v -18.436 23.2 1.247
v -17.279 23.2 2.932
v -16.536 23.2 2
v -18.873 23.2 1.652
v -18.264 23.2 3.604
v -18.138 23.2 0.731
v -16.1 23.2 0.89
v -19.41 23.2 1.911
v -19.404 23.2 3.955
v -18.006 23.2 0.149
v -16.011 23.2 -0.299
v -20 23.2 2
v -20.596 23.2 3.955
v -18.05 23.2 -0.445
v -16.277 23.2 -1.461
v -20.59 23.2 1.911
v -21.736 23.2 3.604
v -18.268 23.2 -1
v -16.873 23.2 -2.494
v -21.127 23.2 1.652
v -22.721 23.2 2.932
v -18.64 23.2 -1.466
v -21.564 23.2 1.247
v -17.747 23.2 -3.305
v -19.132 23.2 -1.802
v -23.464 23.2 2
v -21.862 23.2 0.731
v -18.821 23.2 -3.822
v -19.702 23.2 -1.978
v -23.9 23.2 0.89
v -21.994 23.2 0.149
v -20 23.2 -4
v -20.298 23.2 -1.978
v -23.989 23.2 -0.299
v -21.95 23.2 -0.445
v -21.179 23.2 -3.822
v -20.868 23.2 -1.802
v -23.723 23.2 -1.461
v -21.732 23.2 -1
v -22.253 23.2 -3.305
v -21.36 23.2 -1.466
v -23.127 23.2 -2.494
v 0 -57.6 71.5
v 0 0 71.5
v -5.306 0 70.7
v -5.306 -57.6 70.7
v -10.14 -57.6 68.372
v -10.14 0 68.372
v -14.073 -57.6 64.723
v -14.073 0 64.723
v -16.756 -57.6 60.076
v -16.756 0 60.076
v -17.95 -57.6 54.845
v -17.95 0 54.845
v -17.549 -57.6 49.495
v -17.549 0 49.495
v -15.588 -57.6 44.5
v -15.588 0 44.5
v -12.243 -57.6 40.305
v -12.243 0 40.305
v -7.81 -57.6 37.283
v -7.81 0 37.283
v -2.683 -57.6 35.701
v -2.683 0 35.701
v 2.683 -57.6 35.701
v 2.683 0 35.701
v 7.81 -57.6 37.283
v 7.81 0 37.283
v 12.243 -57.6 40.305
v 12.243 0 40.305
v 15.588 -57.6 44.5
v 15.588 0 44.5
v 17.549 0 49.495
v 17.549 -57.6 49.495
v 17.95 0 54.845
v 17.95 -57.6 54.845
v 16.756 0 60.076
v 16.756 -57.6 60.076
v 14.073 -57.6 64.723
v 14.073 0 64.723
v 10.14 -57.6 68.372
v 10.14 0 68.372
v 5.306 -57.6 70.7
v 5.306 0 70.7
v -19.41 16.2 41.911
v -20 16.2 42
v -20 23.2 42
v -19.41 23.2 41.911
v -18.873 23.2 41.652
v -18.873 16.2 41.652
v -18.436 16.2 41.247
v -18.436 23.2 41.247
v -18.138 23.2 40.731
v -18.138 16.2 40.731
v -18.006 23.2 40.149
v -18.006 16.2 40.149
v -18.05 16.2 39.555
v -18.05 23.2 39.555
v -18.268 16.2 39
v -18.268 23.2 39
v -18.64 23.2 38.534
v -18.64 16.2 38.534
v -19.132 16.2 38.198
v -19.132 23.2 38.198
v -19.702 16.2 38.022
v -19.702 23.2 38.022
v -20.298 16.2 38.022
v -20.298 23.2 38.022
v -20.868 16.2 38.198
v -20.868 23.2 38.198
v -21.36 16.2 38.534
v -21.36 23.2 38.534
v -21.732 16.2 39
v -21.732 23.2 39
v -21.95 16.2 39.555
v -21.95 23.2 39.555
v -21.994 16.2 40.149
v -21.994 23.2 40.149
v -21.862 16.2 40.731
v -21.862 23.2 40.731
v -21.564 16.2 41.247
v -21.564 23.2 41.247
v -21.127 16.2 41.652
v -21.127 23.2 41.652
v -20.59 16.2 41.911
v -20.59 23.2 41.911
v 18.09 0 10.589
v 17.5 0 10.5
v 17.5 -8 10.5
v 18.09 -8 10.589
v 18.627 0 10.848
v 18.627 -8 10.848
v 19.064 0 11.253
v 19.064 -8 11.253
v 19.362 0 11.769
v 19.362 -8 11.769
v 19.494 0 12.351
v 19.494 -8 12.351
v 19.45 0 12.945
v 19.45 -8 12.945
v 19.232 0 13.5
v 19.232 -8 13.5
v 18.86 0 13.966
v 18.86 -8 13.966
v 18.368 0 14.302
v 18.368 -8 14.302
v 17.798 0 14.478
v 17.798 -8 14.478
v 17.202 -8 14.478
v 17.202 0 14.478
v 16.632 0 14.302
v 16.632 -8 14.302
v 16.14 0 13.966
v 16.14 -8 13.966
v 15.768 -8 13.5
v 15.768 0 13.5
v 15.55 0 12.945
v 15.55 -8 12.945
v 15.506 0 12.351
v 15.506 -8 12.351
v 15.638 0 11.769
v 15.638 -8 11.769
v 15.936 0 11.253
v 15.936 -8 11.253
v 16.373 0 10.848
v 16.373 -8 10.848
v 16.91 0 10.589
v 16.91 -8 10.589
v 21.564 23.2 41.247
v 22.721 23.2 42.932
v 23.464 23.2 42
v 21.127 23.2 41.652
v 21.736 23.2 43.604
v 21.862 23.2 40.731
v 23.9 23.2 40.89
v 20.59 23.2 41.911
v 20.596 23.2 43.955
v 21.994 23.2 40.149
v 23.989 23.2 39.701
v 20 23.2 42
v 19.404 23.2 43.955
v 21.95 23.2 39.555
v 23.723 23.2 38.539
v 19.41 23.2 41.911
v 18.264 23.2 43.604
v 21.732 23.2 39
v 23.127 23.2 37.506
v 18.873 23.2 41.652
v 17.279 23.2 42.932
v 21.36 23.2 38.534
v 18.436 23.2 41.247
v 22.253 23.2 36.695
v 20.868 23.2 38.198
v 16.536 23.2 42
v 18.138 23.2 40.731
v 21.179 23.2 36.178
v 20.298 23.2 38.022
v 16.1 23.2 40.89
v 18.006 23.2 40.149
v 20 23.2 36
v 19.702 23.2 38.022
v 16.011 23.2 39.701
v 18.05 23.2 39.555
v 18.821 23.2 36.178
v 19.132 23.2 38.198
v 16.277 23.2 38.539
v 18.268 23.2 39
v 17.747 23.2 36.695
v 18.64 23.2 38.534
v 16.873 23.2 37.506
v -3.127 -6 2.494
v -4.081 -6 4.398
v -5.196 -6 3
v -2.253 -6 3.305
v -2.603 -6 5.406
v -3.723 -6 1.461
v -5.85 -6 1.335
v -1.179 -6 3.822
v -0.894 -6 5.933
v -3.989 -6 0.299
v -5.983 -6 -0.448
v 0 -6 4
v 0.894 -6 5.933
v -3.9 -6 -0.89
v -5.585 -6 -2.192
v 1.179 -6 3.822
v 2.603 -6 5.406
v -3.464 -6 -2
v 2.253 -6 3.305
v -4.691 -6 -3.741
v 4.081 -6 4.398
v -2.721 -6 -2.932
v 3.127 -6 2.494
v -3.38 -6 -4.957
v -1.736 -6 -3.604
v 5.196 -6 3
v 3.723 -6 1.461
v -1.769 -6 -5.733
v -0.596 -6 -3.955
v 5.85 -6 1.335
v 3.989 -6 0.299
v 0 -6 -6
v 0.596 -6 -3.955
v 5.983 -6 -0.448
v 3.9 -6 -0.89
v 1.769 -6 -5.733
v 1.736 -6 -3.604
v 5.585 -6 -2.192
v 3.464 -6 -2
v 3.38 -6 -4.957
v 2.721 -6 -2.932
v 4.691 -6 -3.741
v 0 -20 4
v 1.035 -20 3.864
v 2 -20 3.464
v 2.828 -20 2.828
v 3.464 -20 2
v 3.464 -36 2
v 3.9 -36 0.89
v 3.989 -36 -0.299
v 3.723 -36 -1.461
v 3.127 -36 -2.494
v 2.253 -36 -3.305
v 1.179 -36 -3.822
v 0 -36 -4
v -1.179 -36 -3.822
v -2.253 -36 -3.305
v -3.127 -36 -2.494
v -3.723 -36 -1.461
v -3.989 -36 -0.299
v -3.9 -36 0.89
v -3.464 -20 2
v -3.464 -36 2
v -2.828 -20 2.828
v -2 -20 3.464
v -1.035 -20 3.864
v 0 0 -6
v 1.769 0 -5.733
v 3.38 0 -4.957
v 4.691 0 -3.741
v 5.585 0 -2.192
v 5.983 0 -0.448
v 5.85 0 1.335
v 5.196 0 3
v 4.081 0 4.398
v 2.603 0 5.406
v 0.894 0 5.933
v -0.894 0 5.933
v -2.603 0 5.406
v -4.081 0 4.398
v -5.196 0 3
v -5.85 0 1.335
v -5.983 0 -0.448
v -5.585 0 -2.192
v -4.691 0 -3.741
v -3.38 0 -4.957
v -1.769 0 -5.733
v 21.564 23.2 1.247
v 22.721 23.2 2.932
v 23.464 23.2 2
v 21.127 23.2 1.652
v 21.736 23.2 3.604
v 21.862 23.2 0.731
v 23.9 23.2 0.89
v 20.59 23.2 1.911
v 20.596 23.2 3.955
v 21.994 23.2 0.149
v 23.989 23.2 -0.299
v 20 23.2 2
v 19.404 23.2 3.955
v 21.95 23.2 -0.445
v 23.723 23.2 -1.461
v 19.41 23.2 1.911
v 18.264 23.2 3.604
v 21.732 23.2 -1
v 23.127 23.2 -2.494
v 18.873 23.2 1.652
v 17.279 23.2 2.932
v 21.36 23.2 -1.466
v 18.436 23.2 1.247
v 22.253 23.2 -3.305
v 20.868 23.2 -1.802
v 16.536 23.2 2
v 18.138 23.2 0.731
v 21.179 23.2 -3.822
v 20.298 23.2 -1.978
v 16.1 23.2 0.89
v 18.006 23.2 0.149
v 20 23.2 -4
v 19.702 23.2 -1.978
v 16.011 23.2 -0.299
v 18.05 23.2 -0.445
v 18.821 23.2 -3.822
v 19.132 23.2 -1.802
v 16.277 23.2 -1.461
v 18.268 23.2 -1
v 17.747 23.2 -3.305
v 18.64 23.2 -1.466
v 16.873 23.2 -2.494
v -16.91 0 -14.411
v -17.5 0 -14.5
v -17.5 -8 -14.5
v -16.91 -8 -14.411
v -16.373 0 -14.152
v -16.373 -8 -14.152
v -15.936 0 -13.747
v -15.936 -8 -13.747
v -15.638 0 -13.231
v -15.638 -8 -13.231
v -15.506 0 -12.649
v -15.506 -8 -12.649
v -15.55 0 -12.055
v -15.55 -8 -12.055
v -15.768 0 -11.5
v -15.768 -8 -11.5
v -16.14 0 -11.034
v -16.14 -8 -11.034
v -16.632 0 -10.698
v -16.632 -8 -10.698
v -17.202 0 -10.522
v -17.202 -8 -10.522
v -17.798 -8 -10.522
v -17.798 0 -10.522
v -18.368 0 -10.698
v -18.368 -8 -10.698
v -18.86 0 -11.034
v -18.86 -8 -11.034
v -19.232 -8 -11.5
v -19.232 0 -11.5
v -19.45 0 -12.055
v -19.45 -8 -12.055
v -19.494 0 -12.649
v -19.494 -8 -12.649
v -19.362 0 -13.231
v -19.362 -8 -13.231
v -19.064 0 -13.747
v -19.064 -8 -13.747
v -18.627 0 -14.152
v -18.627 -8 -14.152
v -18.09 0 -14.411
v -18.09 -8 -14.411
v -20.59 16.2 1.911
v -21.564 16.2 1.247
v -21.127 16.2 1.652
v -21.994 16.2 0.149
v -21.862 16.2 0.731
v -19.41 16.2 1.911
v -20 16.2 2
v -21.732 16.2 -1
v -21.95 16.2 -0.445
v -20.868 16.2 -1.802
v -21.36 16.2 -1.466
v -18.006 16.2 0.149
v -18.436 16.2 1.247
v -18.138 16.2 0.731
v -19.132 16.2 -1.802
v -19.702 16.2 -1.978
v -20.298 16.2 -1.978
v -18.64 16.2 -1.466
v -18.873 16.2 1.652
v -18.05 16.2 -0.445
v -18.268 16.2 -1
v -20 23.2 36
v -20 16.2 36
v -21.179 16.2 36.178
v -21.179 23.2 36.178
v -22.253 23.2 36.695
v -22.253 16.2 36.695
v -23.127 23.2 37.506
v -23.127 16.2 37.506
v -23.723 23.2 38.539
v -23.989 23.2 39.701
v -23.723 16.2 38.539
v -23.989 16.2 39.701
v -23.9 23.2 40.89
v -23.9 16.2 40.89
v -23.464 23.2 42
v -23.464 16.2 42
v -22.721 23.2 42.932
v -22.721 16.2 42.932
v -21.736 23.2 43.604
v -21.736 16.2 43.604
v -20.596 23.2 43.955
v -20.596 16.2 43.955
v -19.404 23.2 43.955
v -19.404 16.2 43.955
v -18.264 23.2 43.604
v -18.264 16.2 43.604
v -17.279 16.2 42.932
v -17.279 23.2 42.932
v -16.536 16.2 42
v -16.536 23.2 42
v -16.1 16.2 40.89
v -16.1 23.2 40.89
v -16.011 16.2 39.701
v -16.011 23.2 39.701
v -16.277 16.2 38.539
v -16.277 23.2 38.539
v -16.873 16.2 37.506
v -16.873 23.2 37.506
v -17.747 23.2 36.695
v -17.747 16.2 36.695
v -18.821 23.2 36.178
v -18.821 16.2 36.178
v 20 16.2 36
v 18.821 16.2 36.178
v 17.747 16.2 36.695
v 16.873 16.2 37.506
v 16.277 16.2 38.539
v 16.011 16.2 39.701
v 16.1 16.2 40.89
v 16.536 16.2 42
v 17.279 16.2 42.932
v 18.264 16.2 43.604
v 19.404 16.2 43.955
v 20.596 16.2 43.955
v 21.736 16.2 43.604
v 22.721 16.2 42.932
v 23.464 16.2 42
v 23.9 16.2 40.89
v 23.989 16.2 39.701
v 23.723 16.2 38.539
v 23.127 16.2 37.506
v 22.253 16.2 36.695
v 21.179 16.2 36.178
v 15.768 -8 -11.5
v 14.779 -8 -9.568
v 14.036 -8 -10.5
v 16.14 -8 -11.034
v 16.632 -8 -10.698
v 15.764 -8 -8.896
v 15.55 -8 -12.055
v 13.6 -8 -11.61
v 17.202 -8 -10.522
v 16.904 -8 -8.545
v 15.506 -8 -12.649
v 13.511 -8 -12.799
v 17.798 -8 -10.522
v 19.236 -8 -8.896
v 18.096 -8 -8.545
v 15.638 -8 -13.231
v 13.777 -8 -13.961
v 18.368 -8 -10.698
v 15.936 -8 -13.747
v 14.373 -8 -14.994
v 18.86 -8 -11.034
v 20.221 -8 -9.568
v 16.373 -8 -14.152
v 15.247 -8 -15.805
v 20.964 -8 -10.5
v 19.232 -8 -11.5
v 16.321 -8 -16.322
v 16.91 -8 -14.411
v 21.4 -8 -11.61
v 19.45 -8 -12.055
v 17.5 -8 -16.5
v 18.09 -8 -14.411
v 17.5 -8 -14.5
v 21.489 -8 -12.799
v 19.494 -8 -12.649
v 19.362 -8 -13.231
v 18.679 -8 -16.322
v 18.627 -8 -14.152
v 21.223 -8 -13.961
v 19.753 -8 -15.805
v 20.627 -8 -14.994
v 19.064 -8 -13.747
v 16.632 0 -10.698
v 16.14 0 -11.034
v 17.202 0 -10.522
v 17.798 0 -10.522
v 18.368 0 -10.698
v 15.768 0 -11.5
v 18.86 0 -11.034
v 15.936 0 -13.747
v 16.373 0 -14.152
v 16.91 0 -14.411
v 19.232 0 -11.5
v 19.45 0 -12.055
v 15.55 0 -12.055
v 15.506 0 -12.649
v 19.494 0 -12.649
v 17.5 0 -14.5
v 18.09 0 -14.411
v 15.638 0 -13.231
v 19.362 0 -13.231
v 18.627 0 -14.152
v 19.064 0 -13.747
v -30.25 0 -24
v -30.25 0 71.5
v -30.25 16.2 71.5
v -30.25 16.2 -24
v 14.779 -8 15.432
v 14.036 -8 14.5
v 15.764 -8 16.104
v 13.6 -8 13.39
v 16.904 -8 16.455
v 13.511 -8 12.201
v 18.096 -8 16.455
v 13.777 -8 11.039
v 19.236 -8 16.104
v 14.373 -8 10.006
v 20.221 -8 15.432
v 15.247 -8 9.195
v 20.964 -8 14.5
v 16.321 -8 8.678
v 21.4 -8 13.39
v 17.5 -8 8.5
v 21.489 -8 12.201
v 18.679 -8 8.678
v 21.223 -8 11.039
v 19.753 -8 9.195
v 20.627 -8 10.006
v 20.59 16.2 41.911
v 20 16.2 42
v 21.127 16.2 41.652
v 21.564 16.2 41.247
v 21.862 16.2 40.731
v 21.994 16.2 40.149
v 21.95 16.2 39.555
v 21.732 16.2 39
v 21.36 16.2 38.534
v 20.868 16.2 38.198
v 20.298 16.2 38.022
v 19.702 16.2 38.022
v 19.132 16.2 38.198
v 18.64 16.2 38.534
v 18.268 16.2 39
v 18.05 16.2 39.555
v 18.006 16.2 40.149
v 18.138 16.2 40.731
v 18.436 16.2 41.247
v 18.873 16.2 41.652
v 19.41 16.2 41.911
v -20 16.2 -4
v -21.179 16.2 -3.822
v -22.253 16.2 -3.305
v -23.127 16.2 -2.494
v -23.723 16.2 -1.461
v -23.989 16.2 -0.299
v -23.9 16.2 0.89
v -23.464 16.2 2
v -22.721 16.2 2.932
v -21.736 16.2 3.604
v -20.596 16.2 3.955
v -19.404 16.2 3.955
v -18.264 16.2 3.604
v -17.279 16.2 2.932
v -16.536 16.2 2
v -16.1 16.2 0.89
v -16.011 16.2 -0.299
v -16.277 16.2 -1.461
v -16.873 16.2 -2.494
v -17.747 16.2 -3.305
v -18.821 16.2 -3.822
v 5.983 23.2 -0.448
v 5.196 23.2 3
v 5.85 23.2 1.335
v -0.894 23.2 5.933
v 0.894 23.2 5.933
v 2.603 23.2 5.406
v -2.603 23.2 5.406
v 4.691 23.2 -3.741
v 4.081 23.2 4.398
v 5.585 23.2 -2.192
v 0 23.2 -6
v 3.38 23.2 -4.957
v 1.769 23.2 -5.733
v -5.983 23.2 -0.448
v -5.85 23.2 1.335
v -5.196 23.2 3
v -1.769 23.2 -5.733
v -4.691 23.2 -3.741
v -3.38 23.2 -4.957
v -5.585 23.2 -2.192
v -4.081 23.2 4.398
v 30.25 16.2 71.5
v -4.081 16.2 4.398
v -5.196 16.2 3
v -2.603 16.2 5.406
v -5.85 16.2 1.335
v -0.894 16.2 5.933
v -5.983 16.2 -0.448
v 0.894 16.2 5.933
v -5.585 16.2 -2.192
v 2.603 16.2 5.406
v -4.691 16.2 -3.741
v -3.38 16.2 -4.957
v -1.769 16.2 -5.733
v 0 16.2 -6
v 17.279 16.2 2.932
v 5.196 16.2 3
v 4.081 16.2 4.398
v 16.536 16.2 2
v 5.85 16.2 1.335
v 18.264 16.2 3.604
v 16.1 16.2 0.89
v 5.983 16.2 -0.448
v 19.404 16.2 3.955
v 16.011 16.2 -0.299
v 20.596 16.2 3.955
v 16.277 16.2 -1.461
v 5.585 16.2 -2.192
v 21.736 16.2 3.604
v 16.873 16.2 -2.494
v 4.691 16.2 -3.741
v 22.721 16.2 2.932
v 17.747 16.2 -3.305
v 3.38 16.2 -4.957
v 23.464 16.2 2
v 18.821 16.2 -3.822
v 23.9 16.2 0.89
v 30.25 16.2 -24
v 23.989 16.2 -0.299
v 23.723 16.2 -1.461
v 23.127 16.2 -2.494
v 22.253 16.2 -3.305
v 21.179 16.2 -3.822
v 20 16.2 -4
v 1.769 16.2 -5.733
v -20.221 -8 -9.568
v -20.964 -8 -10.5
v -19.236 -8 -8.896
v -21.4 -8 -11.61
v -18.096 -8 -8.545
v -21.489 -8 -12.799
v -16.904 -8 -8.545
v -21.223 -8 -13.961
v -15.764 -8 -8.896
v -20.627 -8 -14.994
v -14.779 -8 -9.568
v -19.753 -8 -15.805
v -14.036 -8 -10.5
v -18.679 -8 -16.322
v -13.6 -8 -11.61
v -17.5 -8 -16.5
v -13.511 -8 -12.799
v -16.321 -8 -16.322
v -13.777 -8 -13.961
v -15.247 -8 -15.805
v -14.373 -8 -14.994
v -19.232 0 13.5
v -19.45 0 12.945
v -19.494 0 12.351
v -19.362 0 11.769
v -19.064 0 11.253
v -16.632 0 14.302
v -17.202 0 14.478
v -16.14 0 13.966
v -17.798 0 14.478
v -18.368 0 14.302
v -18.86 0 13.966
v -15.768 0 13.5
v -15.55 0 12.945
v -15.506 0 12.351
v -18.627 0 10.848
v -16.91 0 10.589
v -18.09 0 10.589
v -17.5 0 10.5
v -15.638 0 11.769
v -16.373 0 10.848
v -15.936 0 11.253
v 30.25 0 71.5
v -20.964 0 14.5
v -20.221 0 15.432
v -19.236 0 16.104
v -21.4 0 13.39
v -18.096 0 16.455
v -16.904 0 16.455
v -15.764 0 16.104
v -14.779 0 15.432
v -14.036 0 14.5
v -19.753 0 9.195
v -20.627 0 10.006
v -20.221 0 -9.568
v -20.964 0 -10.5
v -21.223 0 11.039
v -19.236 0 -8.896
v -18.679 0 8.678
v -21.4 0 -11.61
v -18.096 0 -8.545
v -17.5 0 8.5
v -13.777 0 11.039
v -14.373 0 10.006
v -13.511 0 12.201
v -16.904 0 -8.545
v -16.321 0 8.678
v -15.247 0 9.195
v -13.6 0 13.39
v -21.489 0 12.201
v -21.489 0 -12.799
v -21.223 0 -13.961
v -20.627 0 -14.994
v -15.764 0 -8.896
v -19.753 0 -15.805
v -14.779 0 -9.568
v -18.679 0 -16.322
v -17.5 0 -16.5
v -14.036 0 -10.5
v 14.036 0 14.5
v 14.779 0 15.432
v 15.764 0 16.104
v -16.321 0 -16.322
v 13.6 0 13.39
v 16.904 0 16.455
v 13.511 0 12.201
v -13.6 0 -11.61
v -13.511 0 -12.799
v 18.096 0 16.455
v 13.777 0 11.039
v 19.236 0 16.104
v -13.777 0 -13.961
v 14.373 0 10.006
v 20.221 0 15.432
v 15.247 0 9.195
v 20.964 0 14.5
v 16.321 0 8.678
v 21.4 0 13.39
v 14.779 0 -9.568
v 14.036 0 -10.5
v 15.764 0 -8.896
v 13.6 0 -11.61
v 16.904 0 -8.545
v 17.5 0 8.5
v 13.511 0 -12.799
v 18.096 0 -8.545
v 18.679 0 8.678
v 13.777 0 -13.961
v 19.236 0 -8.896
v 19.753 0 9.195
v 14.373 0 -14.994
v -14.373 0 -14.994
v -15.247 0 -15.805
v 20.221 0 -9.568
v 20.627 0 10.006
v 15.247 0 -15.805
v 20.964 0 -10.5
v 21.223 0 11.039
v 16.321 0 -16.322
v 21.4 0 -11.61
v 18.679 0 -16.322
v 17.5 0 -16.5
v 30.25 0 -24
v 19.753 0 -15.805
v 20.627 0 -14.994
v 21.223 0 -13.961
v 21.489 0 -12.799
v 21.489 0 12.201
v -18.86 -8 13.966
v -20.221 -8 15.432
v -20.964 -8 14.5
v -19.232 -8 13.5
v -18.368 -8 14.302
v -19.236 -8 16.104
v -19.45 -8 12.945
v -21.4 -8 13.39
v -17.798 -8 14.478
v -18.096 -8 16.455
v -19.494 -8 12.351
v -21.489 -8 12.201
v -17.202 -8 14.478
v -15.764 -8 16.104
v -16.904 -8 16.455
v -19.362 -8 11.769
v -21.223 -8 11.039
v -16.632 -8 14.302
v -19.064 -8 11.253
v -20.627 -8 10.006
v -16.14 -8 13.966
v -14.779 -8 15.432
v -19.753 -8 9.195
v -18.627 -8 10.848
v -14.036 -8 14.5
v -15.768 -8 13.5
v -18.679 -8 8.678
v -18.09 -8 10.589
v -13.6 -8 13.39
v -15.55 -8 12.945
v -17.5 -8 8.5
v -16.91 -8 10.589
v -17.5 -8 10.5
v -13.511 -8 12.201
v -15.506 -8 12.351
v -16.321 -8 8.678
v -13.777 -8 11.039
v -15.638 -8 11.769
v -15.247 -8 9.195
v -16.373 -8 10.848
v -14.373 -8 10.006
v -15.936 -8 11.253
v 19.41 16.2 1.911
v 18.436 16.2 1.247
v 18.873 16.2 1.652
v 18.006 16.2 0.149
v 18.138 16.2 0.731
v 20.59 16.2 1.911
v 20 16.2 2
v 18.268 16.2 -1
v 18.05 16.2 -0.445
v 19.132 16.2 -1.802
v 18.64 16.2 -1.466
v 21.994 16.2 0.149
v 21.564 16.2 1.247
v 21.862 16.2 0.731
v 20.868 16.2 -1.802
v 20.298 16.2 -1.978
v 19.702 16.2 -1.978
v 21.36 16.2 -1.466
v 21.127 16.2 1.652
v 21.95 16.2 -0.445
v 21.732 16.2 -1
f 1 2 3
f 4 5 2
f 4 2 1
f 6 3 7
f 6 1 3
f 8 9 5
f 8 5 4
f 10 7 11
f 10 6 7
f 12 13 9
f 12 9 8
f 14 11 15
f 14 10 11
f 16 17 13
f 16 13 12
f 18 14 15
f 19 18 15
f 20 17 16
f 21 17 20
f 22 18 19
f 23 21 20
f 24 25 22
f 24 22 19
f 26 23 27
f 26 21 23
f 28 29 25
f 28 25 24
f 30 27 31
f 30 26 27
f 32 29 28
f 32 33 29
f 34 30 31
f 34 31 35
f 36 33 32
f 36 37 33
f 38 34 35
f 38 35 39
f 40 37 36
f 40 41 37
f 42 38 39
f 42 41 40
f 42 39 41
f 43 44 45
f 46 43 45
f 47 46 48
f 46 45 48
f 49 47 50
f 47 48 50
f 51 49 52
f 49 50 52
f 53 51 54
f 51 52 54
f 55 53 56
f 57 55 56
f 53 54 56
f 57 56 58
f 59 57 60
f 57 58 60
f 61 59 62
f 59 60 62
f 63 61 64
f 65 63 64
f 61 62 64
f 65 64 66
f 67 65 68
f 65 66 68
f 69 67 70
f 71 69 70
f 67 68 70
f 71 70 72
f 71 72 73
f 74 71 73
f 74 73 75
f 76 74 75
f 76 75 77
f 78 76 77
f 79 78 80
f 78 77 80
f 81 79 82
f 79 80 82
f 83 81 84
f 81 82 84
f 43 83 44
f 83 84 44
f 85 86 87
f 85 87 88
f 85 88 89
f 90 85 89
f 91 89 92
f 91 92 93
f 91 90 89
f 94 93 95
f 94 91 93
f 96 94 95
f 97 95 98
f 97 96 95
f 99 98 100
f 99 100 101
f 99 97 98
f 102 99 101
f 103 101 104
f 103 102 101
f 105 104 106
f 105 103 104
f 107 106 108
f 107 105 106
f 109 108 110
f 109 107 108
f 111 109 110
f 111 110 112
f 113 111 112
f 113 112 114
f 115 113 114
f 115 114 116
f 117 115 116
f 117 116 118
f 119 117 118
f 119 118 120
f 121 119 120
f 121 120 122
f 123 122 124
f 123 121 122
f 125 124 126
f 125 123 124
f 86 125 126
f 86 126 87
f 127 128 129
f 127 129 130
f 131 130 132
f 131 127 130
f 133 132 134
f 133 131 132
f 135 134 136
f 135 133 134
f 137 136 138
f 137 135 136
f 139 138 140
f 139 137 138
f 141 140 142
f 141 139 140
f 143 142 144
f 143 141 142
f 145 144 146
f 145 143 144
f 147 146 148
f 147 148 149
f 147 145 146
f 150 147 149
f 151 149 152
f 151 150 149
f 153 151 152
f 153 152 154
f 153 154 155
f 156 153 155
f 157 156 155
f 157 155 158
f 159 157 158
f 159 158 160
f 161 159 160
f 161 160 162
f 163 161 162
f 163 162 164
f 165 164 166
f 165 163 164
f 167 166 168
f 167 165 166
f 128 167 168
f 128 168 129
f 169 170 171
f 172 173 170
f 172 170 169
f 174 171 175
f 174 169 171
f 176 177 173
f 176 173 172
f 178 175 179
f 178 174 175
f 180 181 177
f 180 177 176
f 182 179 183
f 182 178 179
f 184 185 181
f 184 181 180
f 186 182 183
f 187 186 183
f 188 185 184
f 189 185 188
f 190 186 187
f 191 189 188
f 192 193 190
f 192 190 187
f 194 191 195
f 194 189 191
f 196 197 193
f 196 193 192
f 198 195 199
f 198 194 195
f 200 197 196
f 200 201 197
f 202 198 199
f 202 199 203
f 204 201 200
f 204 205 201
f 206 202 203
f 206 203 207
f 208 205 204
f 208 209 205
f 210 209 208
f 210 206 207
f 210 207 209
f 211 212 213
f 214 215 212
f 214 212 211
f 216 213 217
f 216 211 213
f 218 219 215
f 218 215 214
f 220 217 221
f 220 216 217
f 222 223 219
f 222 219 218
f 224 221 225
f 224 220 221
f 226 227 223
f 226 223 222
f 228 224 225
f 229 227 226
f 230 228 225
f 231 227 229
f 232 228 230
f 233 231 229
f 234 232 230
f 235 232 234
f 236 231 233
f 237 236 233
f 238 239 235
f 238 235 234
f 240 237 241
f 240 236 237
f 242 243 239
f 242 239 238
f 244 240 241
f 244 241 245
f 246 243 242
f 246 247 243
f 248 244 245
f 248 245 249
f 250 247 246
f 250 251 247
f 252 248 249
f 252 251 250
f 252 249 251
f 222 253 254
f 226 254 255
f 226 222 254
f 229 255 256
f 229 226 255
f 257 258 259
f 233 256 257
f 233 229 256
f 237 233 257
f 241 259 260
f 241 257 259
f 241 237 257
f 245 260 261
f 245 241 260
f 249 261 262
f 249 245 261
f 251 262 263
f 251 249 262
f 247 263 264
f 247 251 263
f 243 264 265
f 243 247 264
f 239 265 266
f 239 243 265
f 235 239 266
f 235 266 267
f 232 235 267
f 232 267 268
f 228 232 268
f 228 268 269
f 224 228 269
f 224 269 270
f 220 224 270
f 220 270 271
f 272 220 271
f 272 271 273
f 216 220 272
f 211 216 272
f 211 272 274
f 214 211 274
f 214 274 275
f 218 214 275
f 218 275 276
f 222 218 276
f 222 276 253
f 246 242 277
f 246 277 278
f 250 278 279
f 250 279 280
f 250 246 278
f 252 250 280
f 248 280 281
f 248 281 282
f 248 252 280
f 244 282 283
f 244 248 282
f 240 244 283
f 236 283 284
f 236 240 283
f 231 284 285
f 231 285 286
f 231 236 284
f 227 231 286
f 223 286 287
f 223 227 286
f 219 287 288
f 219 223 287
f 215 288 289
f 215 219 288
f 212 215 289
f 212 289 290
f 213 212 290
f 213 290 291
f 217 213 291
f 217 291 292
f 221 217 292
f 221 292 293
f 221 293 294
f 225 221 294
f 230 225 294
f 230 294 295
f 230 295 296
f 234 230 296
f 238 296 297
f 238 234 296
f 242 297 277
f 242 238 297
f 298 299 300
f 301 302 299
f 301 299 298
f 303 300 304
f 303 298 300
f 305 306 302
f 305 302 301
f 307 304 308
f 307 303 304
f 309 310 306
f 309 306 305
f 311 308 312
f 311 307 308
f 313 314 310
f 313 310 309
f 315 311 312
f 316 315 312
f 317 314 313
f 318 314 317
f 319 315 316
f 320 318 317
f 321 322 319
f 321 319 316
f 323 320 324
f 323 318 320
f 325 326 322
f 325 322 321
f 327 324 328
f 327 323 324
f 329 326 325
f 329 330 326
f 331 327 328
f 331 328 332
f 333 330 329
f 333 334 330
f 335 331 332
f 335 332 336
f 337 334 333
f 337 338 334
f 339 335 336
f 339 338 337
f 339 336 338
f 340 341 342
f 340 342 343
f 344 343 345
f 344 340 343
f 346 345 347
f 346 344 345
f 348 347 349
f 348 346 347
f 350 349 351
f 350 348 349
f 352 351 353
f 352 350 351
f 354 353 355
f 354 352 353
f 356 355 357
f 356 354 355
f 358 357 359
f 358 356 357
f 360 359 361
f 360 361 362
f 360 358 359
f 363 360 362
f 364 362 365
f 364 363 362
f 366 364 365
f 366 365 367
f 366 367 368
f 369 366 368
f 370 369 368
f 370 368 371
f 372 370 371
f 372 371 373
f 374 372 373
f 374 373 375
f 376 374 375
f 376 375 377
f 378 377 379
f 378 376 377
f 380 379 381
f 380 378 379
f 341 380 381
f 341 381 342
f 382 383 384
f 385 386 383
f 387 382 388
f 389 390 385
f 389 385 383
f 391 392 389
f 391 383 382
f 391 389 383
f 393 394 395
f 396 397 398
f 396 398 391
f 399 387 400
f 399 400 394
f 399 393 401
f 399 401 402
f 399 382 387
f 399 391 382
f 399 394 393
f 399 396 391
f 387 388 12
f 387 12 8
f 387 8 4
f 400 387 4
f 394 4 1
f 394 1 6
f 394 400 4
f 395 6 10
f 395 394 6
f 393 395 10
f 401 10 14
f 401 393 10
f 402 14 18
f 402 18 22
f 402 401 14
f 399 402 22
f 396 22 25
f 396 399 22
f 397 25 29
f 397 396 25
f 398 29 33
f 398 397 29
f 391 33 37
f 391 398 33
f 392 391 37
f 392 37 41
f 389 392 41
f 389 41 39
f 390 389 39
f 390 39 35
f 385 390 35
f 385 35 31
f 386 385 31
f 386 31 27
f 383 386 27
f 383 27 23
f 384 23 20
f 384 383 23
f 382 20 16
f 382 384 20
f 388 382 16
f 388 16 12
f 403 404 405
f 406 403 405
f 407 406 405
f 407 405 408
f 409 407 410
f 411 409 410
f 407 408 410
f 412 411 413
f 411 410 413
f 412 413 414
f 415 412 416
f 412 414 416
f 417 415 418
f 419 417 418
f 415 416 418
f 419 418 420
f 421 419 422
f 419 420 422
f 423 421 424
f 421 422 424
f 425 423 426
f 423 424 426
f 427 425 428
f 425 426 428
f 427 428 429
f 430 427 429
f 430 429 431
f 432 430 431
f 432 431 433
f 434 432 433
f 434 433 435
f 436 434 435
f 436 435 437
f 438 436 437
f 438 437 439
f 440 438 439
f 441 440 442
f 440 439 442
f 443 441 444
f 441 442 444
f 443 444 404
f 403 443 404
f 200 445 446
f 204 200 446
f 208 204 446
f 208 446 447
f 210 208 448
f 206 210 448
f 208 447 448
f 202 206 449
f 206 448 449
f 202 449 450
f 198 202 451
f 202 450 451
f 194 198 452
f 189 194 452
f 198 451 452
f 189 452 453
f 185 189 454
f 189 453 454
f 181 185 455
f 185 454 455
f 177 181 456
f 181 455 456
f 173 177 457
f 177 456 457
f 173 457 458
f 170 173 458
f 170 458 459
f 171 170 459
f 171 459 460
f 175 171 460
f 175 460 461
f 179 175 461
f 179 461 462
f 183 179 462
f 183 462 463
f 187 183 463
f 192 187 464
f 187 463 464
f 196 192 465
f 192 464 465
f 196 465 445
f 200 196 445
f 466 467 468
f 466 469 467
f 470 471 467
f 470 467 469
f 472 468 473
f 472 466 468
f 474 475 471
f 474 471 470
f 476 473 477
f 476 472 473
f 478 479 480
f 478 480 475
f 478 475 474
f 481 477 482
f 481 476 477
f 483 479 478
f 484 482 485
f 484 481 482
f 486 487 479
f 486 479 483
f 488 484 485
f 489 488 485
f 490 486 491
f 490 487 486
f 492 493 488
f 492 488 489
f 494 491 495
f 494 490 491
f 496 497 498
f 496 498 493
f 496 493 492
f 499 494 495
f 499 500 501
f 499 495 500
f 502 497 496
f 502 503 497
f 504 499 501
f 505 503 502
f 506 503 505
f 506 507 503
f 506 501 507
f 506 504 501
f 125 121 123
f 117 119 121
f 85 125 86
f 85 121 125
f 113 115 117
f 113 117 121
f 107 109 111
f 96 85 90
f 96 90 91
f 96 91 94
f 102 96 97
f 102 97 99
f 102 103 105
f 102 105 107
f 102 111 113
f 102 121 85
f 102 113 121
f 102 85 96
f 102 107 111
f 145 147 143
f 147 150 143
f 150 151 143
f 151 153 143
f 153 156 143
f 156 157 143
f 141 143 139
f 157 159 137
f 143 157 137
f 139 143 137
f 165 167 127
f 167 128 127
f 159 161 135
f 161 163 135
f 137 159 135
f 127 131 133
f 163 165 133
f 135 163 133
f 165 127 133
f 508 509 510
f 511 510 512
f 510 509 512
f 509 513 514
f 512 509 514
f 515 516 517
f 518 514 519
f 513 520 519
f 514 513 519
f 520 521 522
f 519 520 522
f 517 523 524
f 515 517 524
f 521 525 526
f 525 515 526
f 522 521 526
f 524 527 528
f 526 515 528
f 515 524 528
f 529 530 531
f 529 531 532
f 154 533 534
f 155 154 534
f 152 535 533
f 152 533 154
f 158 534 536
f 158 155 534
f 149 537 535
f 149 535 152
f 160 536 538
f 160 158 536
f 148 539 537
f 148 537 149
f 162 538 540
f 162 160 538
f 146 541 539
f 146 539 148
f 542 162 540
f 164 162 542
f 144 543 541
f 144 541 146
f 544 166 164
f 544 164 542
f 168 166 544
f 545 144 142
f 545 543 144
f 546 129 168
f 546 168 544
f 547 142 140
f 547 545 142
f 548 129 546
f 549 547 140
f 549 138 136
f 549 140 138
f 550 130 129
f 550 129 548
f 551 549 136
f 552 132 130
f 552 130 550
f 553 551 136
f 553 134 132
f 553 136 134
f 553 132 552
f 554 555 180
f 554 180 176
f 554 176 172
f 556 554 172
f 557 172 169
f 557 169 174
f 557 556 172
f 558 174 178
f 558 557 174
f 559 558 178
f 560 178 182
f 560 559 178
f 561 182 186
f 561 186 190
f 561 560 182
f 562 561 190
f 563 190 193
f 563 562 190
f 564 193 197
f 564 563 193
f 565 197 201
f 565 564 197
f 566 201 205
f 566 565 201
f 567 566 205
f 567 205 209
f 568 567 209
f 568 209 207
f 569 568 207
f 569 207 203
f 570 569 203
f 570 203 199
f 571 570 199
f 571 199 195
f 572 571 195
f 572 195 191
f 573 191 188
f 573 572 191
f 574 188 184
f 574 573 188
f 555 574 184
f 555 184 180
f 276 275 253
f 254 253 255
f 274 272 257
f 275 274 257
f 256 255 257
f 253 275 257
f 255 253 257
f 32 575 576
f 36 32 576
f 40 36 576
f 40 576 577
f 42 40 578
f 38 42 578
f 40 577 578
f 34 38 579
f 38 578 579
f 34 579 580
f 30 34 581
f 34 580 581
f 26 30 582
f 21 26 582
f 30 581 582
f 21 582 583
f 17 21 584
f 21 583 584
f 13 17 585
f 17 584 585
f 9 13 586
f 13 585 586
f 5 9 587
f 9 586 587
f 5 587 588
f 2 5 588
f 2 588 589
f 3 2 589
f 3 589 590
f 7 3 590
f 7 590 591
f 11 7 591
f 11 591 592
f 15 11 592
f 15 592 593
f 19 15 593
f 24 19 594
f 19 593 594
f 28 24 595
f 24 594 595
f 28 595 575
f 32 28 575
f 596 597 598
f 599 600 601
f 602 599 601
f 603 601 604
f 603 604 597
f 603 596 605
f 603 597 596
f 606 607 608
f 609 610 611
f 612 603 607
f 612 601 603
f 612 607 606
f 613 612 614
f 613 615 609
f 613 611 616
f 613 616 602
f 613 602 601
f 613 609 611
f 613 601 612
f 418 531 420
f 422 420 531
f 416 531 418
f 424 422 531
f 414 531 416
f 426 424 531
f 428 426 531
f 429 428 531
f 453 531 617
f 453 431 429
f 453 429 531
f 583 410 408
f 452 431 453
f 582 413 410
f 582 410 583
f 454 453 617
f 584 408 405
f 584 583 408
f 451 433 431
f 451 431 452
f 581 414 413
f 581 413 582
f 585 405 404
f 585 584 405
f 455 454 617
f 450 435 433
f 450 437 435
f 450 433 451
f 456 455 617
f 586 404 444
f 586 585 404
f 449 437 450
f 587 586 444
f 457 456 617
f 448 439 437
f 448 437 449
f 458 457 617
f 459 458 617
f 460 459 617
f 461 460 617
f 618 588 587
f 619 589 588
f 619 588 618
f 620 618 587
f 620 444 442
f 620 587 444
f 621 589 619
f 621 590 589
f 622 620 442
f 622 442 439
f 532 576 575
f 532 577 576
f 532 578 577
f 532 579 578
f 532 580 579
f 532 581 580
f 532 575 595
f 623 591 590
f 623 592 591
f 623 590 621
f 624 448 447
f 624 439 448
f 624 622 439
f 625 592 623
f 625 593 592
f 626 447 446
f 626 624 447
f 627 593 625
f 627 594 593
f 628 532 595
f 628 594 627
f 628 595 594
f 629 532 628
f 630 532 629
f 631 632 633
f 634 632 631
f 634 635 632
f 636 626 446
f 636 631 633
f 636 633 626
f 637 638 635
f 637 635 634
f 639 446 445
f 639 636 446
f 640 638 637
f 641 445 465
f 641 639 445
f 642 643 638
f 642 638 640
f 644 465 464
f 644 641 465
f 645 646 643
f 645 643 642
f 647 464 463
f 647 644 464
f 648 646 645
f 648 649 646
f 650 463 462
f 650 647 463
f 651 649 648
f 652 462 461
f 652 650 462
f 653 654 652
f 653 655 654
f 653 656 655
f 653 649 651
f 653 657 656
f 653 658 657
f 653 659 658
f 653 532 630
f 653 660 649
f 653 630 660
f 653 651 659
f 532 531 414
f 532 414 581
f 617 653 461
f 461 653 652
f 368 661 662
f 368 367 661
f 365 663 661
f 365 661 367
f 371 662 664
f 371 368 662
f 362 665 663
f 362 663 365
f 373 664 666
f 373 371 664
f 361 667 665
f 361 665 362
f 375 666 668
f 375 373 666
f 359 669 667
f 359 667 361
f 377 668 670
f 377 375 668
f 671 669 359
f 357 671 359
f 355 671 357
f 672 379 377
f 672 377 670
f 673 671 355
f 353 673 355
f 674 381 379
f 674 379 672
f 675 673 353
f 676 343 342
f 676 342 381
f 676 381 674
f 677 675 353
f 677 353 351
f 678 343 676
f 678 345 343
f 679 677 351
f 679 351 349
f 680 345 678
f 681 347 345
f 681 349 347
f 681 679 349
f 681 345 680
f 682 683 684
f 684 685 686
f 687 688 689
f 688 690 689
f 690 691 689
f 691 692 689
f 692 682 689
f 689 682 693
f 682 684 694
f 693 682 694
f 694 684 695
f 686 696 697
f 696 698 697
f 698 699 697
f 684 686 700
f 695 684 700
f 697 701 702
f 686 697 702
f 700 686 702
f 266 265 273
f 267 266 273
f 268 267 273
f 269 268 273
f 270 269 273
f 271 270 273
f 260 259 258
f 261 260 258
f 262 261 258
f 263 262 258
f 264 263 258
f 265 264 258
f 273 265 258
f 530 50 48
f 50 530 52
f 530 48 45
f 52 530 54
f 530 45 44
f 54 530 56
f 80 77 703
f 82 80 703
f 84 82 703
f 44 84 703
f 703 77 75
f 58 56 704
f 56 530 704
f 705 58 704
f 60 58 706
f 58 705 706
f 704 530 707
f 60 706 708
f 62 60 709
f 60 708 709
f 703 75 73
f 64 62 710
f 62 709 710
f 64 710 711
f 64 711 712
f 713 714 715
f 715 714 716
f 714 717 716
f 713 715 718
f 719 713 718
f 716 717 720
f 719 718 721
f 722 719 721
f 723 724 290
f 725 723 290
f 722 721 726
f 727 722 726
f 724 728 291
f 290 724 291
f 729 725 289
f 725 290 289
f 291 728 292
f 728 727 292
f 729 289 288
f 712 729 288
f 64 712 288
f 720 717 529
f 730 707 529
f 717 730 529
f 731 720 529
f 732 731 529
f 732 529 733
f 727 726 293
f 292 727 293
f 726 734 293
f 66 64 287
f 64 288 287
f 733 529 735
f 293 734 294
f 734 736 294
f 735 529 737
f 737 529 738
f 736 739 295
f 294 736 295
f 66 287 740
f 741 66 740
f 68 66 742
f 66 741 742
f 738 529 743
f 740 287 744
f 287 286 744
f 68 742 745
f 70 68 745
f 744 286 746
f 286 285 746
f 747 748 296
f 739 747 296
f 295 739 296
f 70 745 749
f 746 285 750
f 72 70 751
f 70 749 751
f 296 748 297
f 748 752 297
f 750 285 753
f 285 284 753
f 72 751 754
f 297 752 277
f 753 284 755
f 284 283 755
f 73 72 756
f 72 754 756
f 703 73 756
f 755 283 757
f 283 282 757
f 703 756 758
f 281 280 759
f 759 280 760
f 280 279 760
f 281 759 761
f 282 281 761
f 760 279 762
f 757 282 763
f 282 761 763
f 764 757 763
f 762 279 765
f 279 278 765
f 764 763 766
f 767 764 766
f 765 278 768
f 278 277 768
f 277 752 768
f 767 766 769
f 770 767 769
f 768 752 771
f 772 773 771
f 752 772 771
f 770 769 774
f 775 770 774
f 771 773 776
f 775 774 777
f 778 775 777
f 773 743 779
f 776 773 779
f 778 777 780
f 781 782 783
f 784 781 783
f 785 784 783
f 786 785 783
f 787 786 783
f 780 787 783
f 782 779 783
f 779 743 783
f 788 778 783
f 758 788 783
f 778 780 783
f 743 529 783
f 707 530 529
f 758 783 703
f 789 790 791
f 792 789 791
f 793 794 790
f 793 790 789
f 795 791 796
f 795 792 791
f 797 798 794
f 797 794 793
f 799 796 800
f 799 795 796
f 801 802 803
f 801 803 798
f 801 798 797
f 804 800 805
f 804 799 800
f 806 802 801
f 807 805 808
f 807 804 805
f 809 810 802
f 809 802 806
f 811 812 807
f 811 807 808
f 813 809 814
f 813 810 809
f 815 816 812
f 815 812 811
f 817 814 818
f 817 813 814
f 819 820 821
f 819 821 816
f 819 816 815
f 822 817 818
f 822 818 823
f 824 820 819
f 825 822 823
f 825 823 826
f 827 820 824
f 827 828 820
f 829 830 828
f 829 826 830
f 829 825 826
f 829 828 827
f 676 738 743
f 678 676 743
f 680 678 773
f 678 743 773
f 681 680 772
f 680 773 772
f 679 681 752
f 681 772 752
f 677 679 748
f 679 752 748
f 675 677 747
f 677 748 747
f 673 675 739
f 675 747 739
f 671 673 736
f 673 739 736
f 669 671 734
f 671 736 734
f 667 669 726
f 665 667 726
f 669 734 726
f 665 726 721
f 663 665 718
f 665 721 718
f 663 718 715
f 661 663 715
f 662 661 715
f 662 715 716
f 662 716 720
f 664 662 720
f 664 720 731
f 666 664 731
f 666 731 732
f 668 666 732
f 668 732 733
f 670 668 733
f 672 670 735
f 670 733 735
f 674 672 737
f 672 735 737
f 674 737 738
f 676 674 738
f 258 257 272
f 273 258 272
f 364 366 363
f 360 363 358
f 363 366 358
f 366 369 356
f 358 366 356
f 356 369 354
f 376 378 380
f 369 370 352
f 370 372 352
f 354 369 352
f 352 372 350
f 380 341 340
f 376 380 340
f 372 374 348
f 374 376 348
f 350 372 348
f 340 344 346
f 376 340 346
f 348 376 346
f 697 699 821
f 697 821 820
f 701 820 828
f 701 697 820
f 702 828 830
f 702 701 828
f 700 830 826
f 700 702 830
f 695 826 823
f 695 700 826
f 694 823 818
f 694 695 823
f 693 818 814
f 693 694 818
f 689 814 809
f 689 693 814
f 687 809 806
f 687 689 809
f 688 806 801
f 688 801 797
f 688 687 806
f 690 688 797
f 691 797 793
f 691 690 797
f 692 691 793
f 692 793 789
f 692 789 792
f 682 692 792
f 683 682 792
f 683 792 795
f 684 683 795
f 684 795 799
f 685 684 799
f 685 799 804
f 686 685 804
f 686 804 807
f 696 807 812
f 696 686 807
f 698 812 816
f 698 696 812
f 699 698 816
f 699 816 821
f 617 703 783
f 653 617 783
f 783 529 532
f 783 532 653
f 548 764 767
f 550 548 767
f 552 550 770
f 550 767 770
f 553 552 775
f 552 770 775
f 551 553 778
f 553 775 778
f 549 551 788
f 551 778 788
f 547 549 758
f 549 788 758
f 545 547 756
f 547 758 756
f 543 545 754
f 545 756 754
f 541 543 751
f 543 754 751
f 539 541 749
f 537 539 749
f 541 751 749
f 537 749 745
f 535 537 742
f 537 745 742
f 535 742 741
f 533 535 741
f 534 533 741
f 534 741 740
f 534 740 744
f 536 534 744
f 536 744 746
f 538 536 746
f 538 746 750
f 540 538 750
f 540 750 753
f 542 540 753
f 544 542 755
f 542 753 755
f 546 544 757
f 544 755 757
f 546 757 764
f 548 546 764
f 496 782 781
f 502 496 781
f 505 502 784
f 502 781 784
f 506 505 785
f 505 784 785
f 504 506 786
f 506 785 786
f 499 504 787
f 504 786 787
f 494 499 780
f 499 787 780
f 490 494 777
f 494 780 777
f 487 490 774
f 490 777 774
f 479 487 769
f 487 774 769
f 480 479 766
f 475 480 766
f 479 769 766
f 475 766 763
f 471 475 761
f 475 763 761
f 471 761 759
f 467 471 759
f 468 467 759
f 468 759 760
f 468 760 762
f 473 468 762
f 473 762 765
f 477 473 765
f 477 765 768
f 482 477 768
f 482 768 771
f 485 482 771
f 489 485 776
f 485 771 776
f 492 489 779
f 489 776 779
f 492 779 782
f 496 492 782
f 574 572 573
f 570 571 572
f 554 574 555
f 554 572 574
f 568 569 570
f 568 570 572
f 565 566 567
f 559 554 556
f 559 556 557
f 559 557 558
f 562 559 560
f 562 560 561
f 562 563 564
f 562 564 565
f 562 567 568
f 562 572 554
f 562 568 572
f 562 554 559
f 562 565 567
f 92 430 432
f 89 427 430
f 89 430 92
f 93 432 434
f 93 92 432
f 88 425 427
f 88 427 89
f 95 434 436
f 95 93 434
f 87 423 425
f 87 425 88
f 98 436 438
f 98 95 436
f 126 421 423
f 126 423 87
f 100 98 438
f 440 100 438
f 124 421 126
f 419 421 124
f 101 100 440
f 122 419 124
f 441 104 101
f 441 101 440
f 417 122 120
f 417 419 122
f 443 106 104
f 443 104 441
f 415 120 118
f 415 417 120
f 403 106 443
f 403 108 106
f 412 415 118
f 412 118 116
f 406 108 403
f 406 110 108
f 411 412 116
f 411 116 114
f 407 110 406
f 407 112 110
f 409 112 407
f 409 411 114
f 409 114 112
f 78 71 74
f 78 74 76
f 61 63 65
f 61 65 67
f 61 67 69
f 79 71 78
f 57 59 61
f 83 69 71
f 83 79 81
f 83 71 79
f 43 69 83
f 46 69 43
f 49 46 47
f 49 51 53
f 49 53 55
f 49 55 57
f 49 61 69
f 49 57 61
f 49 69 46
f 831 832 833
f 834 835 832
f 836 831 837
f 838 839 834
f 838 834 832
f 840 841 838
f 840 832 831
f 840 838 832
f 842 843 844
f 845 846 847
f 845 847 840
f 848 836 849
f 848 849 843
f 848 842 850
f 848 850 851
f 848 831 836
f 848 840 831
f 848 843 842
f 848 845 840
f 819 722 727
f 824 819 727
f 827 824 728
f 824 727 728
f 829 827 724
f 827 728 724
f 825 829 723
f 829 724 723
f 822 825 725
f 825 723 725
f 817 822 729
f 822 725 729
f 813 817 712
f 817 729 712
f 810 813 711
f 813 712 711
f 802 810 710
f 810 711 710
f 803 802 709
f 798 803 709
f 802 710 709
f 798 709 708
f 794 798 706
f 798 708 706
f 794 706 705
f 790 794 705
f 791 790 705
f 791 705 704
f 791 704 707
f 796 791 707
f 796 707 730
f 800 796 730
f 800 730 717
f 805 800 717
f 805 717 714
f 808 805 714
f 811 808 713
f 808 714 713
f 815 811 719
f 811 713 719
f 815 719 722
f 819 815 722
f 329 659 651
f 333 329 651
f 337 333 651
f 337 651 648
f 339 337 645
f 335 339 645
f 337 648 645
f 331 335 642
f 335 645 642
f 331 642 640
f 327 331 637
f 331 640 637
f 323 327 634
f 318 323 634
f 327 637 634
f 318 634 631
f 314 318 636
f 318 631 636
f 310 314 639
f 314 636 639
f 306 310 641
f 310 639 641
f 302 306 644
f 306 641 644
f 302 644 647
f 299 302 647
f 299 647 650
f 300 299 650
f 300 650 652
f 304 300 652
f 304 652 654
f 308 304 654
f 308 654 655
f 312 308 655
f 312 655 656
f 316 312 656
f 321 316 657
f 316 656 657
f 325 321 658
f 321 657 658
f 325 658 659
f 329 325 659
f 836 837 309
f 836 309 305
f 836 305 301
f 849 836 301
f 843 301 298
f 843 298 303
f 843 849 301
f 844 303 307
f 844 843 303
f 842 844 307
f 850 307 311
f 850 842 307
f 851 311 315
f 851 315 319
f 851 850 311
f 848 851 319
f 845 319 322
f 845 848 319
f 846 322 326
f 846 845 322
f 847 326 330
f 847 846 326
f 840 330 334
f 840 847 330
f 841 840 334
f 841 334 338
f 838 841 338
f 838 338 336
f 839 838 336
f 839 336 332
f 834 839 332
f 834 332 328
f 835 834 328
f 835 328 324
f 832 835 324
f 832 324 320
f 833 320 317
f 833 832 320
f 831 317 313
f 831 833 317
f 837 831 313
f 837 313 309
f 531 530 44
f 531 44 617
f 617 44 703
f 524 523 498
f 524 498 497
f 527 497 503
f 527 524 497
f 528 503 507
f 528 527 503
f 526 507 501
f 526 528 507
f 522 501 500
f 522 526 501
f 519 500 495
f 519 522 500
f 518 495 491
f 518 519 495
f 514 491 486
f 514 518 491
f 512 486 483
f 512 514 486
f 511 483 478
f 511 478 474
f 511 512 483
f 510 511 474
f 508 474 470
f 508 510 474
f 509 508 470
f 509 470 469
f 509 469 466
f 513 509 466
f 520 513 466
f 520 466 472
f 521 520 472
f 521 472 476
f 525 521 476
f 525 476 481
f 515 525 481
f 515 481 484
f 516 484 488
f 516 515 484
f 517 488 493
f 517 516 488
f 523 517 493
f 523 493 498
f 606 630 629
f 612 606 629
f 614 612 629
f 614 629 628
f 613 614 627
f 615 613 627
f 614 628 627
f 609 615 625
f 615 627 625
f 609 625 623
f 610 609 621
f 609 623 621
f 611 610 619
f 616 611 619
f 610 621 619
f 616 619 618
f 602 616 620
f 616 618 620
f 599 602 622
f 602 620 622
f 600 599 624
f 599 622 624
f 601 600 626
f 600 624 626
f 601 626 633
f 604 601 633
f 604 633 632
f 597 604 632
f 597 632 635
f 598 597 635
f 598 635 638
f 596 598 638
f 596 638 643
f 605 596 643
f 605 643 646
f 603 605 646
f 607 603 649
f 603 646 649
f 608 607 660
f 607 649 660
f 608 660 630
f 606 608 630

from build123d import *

# Parameters (mm, degrees)
SKETCH_1_W          = 60.5
SKETCH_1_H          = 95.5
EXTRUDE_1_DEPTH     = 16.2
SKETCH_2_R          = 6
SKETCH_2_R_2        = 4
SKETCH_2_R_3        = 2
EXTRUDE_2_DEPTH     = 7
EXTRUDE_START       = 6
SKETCH_7_R          = 6
EXTRUDE_6_DEPTH     = 6
SKETCH_3_R          = 4
EXTRUDE_3_DEPTH     = 30
CUT_EXTRUDE_START   = -16
CUT_EXTRUDE_1_DEPTH = 16
SKETCH_5_R          = 4
SKETCH_5_R_2        = 2
EXTRUDE_4_DEPTH     = 8
SKETCH_6_R          = 18
EXTRUDE_5_DEPTH     = 57.6


with BuildPart() as part:
    # 草图1 → 凸台-拉伸1 (new body)
    with BuildSketch(Plane(origin=(0, 0, 0), x_dir=(1, 0, 0), z_dir=(0, 1, 0))):
        with Locations((0, -23.75)):
            Rectangle(SKETCH_1_W, SKETCH_1_H)
    extrude(amount=EXTRUDE_1_DEPTH)

    # 草图2 → 凸台-拉伸2 (add)
    # profile 1 of 5: a face of its own
    with BuildSketch(Plane(origin=(0, 16.2, 0), x_dir=(1, 0, 0), z_dir=(0, 1, 0))):
        with Locations(Location((0, 0, 0), (0, 0, 90))):
            Circle(SKETCH_2_R)
    # profile 2 of 5: a face of its own
    with BuildSketch(Plane(origin=(0, 16.2, 0), x_dir=(1, 0, 0), z_dir=(0, 1, 0))):
        with Locations(Location((-20, 0, 0), (0, 0, 90))):
            Circle(SKETCH_2_R_2)
        with Locations(Location((-20, 0, 0), (0, 0, 270))):
            Circle(SKETCH_2_R_3, mode=Mode.SUBTRACT)
    # profile 3 of 5: a face of its own
    with BuildSketch(Plane(origin=(0, 16.2, 0), x_dir=(1, 0, 0), z_dir=(0, 1, 0))):
        with Locations(Location((20, 0, 0), (0, 0, 90))):
            Circle(SKETCH_2_R_2)
        with Locations(Location((20, 0, 0), (0, 0, 270))):
            Circle(SKETCH_2_R_3, mode=Mode.SUBTRACT)
    # profile 4 of 5: a face of its own
    with BuildSketch(Plane(origin=(0, 16.2, 0), x_dir=(1, 0, 0), z_dir=(0, 1, 0))):
        with Locations(Location((20, -40, 0), (0, 0, 90))):
            Circle(SKETCH_2_R_2)
        with Locations(Location((20, -40, 0), (0, 0, 270))):
            Circle(SKETCH_2_R_3, mode=Mode.SUBTRACT)
    # profile 5 of 5: a face of its own
    with BuildSketch(Plane(origin=(0, 16.2, 0), x_dir=(1, 0, 0), z_dir=(0, 1, 0))):
        with Locations(Location((-20, -40, 0), (0, 0, 90))):
            Circle(SKETCH_2_R_2)
        with Locations(Location((-20, -40, 0), (0, 0, 270))):
            Circle(SKETCH_2_R_3, mode=Mode.SUBTRACT)
    extrude(amount=EXTRUDE_2_DEPTH)

    # 草图7 → 凸台-拉伸6 (add)
    with BuildSketch(Plane.XZ.offset(EXTRUDE_START)):
        with Locations(Location((0, 0, 0), (0, 0, 270))):
            Circle(SKETCH_7_R)
    extrude(amount=-EXTRUDE_6_DEPTH)

    # 草图3 → 凸台-拉伸3 (add)
    with BuildSketch(Plane(origin=(0, -6, 0), x_dir=(1, 0, 0), z_dir=(0, 1, 0))):
        with Locations(Location((0, 0, 0), (0, 0, 270))):
            Circle(SKETCH_3_R)
    extrude(amount=-EXTRUDE_3_DEPTH)

    # 草图4 → 切除-拉伸1 (cut)
    with BuildSketch(Plane(origin=(0, -36, 0), x_dir=(-1, 0, 0), z_dir=(0, -1, 0)).offset(CUT_EXTRUDE_START)):
        with BuildLine():
            Line((-3.464101615, -2), (3.464101615, -2))
            ThreePointArc((3.464101615, -2), (0, -4), (-3.464101615, -2))
        make_face()
    extrude(amount=CUT_EXTRUDE_1_DEPTH, mode=Mode.SUBTRACT)

    # 草图5 → 凸台-拉伸4 (add)
    # profile 1 of 4: a face of its own
    with BuildSketch(Plane(origin=(0, 0, 0), x_dir=(-1, 0, 0), z_dir=(0, -1, 0))):
        with Locations(Location((-17.5, 12.5, 0), (0, 0, 90))):
            Circle(SKETCH_5_R)
        with Locations(Location((-17.5, 12.5, 0), (0, 0, 90))):
            Circle(SKETCH_5_R_2, mode=Mode.SUBTRACT)
    # profile 2 of 4: a face of its own
    with BuildSketch(Plane(origin=(0, 0, 0), x_dir=(-1, 0, 0), z_dir=(0, -1, 0))):
        with Locations(Location((17.5, 12.5, 0), (0, 0, 90))):
            Circle(SKETCH_5_R)
        with Locations(Location((17.5, 12.5, 0), (0, 0, 90))):
            Circle(SKETCH_5_R_2, mode=Mode.SUBTRACT)
    # profile 3 of 4: a face of its own
    with BuildSketch(Plane(origin=(0, 0, 0), x_dir=(-1, 0, 0), z_dir=(0, -1, 0))):
        with Locations(Location((17.5, -12.5, 0), (0, 0, 90))):
            Circle(SKETCH_5_R)
        with Locations(Location((17.5, -12.5, 0), (0, 0, 90))):
            Circle(SKETCH_5_R_2, mode=Mode.SUBTRACT)
    # profile 4 of 4: a face of its own
    with BuildSketch(Plane(origin=(0, 0, 0), x_dir=(-1, 0, 0), z_dir=(0, -1, 0))):
        with Locations(Location((-17.5, -12.5, 0), (0, 0, 90))):
            Circle(SKETCH_5_R)
        with Locations(Location((-17.5, -12.5, 0), (0, 0, 90))):
            Circle(SKETCH_5_R_2, mode=Mode.SUBTRACT)
    extrude(amount=EXTRUDE_4_DEPTH)

    # 草图6 → 凸台-拉伸5 (add)
    with BuildSketch(Plane.XZ):
        with Locations(Location((0, 53.5, 0), (0, 0, 90))):
            Circle(SKETCH_6_R)
    extrude(amount=EXTRUDE_5_DEPTH)


solid = part.part
